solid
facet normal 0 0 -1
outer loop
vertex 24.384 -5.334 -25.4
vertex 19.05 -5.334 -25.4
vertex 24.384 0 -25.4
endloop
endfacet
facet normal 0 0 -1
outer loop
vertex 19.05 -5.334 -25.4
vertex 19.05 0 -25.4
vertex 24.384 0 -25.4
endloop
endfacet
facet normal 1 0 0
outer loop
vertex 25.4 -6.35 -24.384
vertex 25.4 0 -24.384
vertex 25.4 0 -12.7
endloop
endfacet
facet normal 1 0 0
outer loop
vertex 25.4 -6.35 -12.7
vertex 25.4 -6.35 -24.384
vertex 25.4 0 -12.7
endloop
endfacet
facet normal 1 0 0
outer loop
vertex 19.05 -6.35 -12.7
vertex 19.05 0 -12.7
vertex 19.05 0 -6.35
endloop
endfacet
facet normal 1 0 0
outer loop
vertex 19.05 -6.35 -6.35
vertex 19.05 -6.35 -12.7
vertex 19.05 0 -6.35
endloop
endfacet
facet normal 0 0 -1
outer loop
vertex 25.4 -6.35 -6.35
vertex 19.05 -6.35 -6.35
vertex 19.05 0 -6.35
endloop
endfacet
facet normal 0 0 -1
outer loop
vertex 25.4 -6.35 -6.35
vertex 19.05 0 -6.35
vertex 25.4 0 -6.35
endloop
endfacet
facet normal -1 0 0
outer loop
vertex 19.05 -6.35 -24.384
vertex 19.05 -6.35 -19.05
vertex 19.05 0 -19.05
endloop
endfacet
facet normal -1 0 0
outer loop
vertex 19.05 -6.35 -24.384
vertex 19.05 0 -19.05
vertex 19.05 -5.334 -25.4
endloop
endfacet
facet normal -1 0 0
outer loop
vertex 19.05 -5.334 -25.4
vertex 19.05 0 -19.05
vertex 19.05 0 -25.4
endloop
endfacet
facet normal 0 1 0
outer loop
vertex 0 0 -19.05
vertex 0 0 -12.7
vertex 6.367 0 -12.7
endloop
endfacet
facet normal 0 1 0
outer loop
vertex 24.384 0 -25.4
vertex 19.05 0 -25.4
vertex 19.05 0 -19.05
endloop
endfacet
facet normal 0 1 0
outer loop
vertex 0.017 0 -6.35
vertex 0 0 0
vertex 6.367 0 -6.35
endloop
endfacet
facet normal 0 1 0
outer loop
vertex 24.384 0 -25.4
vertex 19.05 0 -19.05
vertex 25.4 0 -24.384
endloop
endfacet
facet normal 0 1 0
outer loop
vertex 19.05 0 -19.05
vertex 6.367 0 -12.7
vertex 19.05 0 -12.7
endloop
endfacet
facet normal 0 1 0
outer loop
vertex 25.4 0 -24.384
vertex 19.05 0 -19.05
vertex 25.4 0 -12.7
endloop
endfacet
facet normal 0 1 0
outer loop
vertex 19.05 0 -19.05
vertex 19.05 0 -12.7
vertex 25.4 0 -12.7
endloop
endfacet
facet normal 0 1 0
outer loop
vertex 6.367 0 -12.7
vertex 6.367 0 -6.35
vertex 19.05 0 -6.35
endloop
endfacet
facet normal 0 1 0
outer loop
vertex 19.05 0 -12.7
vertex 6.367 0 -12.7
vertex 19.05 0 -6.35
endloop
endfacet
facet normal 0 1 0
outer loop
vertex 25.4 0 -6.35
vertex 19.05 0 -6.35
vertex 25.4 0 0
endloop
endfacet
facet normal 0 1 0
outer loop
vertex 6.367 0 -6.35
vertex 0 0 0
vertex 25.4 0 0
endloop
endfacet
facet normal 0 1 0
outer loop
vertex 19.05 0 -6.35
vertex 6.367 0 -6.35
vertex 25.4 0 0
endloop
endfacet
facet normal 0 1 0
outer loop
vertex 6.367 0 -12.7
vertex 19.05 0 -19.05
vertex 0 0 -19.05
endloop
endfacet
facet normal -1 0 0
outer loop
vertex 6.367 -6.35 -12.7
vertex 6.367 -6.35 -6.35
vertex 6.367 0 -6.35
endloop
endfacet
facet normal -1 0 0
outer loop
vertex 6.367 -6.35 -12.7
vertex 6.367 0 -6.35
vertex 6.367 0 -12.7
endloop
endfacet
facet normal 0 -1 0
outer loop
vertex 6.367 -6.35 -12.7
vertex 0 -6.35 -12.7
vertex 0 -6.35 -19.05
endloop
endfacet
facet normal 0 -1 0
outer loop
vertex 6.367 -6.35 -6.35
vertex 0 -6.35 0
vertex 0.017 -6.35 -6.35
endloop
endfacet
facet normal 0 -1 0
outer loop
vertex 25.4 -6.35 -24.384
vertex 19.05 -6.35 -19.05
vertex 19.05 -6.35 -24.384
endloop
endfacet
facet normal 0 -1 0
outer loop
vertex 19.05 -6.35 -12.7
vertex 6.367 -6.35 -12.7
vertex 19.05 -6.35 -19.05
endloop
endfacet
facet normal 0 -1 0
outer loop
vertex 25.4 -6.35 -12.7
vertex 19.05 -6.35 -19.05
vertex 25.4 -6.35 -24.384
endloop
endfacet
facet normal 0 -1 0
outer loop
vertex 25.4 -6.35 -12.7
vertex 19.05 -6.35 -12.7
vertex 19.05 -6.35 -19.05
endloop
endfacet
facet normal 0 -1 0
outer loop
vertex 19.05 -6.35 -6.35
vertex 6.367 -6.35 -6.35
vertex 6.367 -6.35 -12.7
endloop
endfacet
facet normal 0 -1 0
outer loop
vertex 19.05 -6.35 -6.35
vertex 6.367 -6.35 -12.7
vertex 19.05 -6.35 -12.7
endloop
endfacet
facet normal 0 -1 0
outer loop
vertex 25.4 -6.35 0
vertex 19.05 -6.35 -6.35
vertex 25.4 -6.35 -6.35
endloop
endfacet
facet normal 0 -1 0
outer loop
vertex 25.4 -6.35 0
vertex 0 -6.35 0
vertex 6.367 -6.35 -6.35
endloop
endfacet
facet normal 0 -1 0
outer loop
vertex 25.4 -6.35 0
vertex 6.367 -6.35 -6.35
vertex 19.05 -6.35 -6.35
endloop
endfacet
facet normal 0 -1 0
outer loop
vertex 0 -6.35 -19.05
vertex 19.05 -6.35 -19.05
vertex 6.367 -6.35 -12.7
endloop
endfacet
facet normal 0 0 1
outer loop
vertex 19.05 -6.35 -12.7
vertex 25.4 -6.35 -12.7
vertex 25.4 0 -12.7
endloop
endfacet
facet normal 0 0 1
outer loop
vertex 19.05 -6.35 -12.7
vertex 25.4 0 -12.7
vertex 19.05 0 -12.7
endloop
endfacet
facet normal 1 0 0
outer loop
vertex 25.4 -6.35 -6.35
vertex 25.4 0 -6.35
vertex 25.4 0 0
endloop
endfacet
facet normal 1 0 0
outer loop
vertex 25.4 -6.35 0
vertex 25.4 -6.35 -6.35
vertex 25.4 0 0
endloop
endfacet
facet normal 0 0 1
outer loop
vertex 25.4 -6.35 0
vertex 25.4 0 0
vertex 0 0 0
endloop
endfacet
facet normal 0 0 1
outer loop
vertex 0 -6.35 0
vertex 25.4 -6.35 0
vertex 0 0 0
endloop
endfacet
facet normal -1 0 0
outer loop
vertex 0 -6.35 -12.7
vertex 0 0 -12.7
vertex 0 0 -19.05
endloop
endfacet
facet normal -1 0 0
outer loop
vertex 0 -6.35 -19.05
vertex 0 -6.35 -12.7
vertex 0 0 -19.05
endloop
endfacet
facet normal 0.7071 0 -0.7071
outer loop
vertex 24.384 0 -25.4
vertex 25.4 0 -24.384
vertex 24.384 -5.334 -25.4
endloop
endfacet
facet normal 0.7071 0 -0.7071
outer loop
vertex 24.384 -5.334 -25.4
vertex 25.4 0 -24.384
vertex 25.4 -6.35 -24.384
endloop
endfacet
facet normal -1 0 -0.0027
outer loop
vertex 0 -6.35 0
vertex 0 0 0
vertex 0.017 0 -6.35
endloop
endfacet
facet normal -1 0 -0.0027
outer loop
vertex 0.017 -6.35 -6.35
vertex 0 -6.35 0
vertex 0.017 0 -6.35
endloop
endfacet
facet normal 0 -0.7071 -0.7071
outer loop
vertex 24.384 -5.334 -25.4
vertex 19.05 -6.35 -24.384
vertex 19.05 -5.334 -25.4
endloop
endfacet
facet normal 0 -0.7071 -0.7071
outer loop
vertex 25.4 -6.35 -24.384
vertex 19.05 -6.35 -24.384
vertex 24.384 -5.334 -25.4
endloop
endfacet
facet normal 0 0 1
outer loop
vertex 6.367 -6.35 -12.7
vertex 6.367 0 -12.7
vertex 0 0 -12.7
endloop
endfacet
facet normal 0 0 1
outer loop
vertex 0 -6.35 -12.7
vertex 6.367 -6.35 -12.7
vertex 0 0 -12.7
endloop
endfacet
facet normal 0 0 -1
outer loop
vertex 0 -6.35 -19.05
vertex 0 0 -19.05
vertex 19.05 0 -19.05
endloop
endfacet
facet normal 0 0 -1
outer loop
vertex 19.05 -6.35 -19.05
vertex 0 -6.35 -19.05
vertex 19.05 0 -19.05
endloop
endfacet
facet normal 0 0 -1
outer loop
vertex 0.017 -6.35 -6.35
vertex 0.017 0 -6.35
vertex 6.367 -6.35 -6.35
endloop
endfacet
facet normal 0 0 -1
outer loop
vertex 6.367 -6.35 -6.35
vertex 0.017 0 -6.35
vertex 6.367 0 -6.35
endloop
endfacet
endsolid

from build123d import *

# Parameters (mm, degrees)
F1_DEPTH = 6.35
F2_SIZE  = 1.016
F3_SIZE  = 1.016


# Not quite as in the source:
# - a feature of the source that left no trace in its solid (it failed there, or was rolled back) is left out


with BuildPart() as f1:
    # F0 (on Front) → F1 (new body)
    with BuildSketch(Plane.XZ):
        Polygon((25.4, 0), (0, 0), (0.0169261405, -6.35), (6.3669261405, -6.35), (6.3669261405, -12.7), (0, -12.7), (0, -19.05), (19.05, -19.05), (19.05, -25.4), (25.4, -25.4), (25.4, -12.7), (19.05, -12.7), (19.05, -6.35), (25.4, -6.35), align=None)
    extrude(amount=F1_DEPTH)

    # F2
    f2_edges = [f1.edges().sort_by_distance(p)[0] for p in [
        (22.225, -6.35, -25.4),
    ]]
    chamfer(f2_edges, length=F2_SIZE)

    # F3
    f3_edges = [f1.edges().sort_by_distance(p)[0] for p in [
        (25.4, -2.667, -25.4),
    ]]
    chamfer(f3_edges, length=F3_SIZE)


solid = f1.part
